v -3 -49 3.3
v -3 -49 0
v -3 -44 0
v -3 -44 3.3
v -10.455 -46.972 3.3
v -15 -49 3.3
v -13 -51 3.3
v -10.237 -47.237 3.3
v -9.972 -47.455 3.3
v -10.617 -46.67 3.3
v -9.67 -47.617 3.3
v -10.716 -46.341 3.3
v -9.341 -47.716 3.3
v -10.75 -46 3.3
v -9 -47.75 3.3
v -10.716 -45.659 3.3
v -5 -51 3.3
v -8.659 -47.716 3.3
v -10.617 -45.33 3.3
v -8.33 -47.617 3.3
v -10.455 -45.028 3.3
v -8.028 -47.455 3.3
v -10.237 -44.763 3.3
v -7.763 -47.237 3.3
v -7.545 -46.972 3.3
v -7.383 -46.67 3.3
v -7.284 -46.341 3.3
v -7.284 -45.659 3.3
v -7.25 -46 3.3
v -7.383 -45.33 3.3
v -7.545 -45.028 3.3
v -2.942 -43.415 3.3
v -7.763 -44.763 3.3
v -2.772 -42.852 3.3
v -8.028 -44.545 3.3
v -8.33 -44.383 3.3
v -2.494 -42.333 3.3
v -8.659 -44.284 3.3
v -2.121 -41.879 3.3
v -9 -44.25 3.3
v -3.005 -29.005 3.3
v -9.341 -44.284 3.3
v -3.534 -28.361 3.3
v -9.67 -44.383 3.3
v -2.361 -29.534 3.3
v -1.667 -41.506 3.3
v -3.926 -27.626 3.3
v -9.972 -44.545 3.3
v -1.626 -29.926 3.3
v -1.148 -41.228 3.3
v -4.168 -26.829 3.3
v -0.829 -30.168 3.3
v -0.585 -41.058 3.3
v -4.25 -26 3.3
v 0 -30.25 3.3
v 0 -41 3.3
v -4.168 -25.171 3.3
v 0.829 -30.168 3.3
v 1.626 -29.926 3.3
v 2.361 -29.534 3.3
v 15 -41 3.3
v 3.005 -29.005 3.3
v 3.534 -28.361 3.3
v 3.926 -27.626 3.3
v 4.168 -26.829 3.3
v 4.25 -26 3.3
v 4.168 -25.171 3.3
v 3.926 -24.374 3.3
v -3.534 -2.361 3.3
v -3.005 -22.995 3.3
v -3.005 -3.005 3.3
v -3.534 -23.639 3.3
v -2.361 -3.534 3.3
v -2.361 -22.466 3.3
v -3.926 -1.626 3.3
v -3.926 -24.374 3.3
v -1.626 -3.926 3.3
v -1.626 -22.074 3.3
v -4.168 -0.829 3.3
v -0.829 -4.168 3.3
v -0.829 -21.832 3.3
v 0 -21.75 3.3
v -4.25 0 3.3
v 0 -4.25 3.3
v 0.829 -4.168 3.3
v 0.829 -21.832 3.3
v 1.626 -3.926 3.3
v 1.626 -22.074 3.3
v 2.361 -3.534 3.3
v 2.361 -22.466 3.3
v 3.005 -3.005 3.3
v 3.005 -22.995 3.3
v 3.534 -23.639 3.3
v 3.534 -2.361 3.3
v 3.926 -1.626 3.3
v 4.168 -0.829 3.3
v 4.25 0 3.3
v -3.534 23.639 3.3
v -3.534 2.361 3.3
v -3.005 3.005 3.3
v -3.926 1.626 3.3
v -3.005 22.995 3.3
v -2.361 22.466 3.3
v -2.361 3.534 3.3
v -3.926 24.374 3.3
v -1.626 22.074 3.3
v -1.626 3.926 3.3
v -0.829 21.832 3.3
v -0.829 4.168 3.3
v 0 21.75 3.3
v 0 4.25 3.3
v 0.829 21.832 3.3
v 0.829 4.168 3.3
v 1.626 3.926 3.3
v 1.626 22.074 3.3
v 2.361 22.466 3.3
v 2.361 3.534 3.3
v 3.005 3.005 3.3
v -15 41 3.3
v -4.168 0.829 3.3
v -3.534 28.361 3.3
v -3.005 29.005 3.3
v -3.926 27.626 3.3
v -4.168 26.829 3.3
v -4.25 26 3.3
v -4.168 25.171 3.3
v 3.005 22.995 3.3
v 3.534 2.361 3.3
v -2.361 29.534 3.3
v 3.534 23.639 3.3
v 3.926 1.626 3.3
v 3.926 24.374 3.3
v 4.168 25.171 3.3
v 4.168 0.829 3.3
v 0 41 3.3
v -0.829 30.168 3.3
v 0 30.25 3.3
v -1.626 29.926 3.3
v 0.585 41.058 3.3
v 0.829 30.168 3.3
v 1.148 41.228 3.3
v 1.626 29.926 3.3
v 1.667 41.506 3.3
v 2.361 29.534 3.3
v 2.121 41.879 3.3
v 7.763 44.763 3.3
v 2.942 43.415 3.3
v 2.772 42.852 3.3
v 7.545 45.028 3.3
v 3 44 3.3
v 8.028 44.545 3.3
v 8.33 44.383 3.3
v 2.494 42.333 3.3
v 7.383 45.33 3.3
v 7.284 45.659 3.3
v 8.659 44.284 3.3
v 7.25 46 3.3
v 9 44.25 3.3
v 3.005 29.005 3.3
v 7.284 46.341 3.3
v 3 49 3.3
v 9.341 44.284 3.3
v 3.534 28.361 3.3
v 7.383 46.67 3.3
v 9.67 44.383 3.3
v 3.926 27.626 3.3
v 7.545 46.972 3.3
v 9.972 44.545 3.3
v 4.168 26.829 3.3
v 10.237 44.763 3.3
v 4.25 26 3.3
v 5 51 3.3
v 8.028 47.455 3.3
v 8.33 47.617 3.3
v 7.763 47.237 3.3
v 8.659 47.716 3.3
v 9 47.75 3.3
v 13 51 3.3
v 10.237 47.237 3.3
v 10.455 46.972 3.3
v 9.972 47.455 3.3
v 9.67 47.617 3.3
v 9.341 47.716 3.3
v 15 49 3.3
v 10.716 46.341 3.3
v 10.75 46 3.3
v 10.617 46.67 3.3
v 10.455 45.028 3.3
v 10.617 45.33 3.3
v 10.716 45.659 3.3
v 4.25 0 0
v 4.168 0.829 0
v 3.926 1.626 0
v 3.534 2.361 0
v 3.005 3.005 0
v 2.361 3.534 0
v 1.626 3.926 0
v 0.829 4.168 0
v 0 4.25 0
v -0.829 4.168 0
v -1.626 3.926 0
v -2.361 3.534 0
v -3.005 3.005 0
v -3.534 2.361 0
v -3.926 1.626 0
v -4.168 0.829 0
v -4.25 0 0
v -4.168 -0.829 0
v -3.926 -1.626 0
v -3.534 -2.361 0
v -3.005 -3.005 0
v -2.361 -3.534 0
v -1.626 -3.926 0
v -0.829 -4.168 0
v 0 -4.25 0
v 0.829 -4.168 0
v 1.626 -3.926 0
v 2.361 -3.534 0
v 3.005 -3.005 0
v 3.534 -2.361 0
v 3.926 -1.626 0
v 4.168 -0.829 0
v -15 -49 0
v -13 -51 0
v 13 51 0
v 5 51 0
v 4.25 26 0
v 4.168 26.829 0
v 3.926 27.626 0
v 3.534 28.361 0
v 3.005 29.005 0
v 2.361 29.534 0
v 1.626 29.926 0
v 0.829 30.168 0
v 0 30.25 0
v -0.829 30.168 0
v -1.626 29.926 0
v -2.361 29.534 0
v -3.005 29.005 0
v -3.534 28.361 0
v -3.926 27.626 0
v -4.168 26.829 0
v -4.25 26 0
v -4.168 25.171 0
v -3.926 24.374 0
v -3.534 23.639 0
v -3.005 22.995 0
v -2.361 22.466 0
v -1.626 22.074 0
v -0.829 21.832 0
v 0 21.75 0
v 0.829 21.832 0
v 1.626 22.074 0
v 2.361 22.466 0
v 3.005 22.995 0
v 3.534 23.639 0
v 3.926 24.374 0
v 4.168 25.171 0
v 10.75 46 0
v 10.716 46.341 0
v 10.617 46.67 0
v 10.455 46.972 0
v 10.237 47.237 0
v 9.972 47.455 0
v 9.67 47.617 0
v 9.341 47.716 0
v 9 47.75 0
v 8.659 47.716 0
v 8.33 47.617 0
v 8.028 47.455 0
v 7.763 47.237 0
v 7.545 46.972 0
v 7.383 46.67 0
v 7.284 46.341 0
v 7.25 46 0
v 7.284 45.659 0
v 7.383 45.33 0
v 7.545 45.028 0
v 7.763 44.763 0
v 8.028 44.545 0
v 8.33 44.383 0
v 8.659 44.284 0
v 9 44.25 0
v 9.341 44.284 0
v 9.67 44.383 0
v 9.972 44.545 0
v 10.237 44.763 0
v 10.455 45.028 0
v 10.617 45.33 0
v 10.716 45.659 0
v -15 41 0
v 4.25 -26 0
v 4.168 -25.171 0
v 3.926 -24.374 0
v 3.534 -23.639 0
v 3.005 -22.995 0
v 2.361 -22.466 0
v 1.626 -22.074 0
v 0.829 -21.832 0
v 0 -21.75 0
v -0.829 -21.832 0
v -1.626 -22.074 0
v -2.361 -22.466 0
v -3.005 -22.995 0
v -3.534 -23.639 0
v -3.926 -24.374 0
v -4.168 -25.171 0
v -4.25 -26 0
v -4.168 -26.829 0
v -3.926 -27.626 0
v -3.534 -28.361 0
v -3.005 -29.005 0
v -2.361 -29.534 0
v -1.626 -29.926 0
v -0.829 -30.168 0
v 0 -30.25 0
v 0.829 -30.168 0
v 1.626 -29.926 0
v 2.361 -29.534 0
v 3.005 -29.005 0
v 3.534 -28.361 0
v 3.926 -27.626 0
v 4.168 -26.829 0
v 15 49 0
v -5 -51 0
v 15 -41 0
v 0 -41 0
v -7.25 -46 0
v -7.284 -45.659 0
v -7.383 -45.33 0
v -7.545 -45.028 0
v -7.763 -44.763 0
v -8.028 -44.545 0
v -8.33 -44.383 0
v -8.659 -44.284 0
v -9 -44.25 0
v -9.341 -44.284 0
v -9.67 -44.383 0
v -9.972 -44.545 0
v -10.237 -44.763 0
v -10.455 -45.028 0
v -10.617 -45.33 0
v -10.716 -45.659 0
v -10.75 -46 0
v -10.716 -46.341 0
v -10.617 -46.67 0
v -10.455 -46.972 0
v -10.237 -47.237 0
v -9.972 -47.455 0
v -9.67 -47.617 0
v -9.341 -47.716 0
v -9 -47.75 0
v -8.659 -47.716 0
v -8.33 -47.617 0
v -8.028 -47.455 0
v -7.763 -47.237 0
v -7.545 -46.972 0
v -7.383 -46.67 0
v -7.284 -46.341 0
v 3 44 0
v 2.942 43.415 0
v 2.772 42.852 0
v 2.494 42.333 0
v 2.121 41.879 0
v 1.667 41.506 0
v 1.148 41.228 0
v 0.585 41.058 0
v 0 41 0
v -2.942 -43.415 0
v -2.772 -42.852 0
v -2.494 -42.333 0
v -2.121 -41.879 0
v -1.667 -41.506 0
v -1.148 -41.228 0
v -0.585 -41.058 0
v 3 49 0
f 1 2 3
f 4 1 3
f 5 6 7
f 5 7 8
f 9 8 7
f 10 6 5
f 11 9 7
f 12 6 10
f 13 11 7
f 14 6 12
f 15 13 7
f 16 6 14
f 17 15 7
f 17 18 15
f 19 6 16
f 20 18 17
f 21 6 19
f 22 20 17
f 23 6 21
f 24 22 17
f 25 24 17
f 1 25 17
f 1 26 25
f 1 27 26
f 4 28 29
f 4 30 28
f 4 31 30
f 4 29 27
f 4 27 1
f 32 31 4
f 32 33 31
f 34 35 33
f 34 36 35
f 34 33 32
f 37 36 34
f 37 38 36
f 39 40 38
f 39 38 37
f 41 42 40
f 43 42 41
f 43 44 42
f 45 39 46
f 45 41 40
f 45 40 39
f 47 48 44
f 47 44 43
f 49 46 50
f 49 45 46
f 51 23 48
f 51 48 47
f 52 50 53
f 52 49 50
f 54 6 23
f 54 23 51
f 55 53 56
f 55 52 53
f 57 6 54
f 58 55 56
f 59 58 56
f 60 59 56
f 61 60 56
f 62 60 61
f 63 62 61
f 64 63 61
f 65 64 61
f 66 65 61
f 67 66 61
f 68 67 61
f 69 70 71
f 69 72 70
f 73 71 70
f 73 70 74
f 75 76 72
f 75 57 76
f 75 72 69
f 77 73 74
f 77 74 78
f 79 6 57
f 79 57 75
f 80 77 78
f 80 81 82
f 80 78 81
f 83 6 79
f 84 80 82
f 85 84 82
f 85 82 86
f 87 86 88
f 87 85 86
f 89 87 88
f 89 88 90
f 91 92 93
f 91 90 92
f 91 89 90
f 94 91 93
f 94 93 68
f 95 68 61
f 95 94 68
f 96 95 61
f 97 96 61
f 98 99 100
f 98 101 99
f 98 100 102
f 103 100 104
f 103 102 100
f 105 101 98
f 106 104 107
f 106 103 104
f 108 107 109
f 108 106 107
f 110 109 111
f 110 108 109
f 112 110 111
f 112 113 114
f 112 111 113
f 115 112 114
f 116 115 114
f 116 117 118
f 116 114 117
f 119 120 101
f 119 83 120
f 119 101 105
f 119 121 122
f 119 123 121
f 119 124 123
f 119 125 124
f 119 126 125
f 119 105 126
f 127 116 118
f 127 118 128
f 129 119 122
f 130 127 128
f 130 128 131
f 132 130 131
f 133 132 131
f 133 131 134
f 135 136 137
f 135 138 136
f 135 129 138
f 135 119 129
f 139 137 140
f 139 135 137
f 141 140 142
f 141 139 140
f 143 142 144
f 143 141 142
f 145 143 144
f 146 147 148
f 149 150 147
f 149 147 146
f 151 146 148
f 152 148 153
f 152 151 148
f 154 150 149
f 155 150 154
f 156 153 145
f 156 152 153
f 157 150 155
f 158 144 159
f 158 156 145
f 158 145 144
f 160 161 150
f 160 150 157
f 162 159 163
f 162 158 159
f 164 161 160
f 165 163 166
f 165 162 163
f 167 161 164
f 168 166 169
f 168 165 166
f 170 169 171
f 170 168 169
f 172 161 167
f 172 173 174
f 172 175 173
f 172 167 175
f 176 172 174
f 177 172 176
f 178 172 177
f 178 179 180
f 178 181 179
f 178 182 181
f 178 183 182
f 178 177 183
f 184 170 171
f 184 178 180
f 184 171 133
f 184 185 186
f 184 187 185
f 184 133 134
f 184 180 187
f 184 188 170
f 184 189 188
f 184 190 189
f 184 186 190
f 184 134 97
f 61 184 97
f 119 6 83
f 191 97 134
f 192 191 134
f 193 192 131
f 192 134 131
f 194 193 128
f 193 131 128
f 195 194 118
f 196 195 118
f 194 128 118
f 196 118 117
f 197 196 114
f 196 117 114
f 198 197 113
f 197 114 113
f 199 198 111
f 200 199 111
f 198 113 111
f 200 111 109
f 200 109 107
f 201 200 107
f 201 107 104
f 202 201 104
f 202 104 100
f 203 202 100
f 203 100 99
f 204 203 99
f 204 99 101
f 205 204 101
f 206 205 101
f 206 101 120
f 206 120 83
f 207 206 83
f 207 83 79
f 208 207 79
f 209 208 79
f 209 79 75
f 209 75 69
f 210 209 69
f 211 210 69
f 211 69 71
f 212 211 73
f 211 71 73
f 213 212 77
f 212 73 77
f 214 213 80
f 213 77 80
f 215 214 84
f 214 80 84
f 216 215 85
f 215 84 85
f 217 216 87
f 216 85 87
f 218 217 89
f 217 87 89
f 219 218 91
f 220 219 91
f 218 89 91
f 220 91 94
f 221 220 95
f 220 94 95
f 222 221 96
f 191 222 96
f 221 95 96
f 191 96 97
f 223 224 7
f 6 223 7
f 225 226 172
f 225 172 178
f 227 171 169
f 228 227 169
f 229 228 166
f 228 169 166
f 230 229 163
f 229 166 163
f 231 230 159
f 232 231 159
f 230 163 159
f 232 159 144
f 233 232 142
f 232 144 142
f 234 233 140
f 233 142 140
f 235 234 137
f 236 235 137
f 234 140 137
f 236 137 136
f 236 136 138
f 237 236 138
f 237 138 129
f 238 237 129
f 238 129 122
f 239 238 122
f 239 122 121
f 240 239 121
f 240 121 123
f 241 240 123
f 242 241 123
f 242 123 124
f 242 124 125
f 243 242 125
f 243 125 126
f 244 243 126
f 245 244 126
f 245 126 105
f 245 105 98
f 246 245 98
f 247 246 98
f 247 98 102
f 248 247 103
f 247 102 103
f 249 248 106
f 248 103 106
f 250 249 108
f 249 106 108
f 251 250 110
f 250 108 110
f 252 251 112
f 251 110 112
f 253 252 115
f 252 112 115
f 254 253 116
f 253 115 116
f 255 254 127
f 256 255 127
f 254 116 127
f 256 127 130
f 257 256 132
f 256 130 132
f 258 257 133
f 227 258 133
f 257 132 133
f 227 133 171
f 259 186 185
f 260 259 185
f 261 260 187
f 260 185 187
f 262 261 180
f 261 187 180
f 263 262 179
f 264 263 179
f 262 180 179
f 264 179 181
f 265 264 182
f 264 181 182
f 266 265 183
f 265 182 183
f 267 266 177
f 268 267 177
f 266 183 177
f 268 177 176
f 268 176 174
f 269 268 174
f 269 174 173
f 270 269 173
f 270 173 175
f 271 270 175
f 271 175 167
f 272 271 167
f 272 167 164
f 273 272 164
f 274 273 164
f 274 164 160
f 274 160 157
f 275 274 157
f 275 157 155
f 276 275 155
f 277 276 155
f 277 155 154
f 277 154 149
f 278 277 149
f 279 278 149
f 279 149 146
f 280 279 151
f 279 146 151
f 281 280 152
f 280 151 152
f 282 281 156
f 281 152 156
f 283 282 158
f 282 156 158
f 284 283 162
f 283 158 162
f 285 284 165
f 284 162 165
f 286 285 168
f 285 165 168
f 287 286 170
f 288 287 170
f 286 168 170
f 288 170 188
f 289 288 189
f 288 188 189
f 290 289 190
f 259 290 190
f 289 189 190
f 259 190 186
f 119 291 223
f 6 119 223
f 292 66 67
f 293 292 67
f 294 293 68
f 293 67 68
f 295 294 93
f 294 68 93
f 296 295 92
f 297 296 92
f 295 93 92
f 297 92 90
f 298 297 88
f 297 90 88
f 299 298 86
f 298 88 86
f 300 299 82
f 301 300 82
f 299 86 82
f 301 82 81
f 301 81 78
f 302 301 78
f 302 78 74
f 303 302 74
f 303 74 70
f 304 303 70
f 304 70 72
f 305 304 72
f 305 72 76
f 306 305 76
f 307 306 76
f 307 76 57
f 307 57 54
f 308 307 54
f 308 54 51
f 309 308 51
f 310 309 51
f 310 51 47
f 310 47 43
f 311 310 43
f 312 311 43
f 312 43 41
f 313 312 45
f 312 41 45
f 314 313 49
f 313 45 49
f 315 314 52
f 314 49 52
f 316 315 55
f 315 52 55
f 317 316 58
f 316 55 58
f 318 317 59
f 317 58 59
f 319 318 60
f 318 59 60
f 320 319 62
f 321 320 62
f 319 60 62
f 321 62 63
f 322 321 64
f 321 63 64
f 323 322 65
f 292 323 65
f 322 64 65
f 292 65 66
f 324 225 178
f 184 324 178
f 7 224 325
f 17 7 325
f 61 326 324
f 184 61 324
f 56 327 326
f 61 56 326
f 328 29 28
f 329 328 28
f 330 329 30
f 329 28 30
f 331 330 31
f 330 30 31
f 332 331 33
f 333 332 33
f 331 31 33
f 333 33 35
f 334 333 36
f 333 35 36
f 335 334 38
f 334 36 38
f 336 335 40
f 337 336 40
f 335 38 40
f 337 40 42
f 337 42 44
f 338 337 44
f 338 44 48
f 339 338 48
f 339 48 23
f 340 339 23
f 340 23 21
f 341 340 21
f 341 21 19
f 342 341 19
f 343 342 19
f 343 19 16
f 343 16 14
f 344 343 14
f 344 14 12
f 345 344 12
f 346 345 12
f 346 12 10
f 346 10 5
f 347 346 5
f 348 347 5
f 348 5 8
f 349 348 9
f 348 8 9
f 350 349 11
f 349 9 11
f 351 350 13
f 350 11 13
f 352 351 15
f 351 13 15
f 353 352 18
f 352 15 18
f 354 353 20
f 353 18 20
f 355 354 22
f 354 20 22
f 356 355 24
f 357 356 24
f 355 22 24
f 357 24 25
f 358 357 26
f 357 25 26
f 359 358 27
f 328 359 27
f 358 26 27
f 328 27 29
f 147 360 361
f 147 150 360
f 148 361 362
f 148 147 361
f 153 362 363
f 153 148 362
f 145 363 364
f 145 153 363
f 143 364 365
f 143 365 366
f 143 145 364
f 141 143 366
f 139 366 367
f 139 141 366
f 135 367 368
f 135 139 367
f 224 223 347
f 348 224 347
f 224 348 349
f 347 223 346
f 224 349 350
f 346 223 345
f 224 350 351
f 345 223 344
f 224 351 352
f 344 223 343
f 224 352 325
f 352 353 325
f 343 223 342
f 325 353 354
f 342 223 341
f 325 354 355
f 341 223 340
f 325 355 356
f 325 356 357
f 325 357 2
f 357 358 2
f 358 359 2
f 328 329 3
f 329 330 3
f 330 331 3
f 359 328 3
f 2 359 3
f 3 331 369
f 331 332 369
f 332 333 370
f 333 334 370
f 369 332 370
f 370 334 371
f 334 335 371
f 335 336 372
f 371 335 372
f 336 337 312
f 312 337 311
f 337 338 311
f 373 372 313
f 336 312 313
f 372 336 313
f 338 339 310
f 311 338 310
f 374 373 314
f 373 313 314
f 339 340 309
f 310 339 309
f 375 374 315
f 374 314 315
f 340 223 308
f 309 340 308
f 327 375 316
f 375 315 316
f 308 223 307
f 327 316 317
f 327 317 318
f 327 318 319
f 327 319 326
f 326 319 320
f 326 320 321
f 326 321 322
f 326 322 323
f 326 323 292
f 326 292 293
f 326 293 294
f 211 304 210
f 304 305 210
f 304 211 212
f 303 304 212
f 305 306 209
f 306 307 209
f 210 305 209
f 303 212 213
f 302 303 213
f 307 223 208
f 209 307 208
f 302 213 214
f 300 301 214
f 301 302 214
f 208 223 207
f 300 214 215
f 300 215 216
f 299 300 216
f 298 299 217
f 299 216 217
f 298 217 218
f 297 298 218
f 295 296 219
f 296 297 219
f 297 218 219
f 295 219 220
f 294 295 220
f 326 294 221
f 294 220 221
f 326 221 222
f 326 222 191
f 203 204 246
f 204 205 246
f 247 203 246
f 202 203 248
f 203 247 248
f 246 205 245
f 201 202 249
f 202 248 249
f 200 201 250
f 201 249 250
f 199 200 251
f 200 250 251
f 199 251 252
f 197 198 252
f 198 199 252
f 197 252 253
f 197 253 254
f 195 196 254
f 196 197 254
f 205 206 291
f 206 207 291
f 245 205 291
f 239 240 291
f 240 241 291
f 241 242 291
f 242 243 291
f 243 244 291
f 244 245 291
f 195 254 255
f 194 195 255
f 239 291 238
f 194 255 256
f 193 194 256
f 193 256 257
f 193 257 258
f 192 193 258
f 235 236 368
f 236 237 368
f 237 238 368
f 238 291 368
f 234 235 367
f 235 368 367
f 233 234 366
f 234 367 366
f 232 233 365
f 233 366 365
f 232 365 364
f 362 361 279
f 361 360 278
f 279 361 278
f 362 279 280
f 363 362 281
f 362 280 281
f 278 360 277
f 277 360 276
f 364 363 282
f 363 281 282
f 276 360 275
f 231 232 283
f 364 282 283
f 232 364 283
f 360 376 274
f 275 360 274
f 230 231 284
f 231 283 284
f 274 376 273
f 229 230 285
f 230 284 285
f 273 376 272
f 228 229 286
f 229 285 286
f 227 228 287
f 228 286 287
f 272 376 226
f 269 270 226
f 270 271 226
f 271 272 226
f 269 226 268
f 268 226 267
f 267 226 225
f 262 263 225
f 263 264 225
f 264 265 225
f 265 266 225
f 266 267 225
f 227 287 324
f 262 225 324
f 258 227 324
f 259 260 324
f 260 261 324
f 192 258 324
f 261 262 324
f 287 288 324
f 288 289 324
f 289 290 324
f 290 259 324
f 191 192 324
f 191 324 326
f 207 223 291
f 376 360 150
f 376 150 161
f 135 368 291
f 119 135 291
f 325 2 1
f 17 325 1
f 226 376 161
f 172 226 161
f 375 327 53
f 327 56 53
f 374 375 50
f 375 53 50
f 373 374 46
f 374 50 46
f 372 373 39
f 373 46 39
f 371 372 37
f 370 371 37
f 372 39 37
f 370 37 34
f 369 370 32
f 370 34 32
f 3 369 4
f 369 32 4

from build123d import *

# Parameters (mm, degrees)
F0_W      = 12
F0_H      = 10
F1_DEPTH  = 3.3
F2_SIZE   = 2
F3_R      = 3
F4_R      = 3
F5_R      = 1.75
F6_DEPTH  = 25
F7_R      = 2.5
F8_DEPTH  = 25
F9_R      = 4.25
F10_DEPTH = 25


with BuildPart() as f1:
    # F0 (on Top) → F1 (new body)
    with BuildSketch(Plane.XY):
        Polygon((15, -41), (15, 41), (3, 41), (-15, 41), (-15, -41), (-3, -41), align=None)
        with Locations((9, 46)):
            Rectangle(F0_W, F0_H)
        with Locations((-9, -46)):
            Rectangle(F0_W, F0_H)
    extrude(amount=F1_DEPTH)

    # F2
    f2_edges = [f1.edges().sort_by_distance(p)[0] for p in [
        (15, 51, 1.65),
        (3, 51, 1.65),
        (-15, -51, 1.65),
        (-3, -51, 1.65),
    ]]
    chamfer(f2_edges, length=F2_SIZE)

    # F3
    f3_edges = [f1.edges().sort_by_distance(p)[0] for p in [
        (3, 41, 1.65),
    ]]
    fillet(f3_edges, radius=F3_R)

    # F4
    f4_edges = [f1.edges().sort_by_distance(p)[0] for p in [
        (-3, -41, 1.65),
    ]]
    fillet(f4_edges, radius=F4_R)

    # F5 (on face) → F6 (cut)
    with BuildSketch(Plane.XY.offset(3.3)):
        with Locations((9, 46)):
            Circle(F5_R)
        with Locations((-9, -46)):
            Circle(F5_R)
    extrude(amount=-F6_DEPTH, mode=Mode.SUBTRACT)

    # F7 (on face) → F8 (cut)
    with BuildSketch(Plane.XY.offset(3.3)):
        with Locations((0, 26)):
            Circle(F7_R)
        with Locations((0, -26)):
            Circle(F7_R)
    extrude(amount=-F8_DEPTH, mode=Mode.SUBTRACT)

    # F9 (on face) → F10 (cut)
    with BuildSketch(Plane.XY.offset(3.3)):
        with Locations((0, 26)):
            Circle(F9_R)
        with Locations((0, -26)):
            Circle(F9_R)
        Circle(F9_R)
    extrude(amount=-F10_DEPTH, mode=Mode.SUBTRACT)


solid = f1.part
